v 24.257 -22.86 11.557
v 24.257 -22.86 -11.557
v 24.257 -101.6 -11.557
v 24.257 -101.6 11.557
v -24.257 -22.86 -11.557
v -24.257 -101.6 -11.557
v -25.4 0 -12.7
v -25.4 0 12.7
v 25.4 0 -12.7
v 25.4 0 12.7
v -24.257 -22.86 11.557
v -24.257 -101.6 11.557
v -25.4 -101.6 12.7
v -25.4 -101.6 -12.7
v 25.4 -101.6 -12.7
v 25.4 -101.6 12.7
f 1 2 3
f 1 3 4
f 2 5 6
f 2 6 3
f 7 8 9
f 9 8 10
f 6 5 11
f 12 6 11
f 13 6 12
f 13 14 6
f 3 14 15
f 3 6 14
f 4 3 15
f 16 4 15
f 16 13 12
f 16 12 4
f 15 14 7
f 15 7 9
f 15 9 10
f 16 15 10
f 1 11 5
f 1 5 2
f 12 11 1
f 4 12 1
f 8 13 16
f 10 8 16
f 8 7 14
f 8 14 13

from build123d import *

# Parameters (mm, degrees)
F1_W     = 50.8
F1_H     = 25.4
F1_W_2   = 48.514
F1_H_2   = 23.114
F2_DEPTH = 101.6
F3_W     = 50.8
F3_H     = 25.4
F4_DEPTH = 22.86


with BuildPart() as f2:
    # F1 (on face) → F2 (new body)
    with BuildSketch(Plane.XZ):
        Rectangle(F1_W, F1_H)
        Rectangle(F1_W_2, F1_H_2, mode=Mode.SUBTRACT)
    extrude(amount=F2_DEPTH)

    # F3 (on Front) → F4 (join)
    with BuildSketch(Plane.XZ):
        Rectangle(F3_W, F3_H)
    extrude(amount=F4_DEPTH)


solid = f2.part
